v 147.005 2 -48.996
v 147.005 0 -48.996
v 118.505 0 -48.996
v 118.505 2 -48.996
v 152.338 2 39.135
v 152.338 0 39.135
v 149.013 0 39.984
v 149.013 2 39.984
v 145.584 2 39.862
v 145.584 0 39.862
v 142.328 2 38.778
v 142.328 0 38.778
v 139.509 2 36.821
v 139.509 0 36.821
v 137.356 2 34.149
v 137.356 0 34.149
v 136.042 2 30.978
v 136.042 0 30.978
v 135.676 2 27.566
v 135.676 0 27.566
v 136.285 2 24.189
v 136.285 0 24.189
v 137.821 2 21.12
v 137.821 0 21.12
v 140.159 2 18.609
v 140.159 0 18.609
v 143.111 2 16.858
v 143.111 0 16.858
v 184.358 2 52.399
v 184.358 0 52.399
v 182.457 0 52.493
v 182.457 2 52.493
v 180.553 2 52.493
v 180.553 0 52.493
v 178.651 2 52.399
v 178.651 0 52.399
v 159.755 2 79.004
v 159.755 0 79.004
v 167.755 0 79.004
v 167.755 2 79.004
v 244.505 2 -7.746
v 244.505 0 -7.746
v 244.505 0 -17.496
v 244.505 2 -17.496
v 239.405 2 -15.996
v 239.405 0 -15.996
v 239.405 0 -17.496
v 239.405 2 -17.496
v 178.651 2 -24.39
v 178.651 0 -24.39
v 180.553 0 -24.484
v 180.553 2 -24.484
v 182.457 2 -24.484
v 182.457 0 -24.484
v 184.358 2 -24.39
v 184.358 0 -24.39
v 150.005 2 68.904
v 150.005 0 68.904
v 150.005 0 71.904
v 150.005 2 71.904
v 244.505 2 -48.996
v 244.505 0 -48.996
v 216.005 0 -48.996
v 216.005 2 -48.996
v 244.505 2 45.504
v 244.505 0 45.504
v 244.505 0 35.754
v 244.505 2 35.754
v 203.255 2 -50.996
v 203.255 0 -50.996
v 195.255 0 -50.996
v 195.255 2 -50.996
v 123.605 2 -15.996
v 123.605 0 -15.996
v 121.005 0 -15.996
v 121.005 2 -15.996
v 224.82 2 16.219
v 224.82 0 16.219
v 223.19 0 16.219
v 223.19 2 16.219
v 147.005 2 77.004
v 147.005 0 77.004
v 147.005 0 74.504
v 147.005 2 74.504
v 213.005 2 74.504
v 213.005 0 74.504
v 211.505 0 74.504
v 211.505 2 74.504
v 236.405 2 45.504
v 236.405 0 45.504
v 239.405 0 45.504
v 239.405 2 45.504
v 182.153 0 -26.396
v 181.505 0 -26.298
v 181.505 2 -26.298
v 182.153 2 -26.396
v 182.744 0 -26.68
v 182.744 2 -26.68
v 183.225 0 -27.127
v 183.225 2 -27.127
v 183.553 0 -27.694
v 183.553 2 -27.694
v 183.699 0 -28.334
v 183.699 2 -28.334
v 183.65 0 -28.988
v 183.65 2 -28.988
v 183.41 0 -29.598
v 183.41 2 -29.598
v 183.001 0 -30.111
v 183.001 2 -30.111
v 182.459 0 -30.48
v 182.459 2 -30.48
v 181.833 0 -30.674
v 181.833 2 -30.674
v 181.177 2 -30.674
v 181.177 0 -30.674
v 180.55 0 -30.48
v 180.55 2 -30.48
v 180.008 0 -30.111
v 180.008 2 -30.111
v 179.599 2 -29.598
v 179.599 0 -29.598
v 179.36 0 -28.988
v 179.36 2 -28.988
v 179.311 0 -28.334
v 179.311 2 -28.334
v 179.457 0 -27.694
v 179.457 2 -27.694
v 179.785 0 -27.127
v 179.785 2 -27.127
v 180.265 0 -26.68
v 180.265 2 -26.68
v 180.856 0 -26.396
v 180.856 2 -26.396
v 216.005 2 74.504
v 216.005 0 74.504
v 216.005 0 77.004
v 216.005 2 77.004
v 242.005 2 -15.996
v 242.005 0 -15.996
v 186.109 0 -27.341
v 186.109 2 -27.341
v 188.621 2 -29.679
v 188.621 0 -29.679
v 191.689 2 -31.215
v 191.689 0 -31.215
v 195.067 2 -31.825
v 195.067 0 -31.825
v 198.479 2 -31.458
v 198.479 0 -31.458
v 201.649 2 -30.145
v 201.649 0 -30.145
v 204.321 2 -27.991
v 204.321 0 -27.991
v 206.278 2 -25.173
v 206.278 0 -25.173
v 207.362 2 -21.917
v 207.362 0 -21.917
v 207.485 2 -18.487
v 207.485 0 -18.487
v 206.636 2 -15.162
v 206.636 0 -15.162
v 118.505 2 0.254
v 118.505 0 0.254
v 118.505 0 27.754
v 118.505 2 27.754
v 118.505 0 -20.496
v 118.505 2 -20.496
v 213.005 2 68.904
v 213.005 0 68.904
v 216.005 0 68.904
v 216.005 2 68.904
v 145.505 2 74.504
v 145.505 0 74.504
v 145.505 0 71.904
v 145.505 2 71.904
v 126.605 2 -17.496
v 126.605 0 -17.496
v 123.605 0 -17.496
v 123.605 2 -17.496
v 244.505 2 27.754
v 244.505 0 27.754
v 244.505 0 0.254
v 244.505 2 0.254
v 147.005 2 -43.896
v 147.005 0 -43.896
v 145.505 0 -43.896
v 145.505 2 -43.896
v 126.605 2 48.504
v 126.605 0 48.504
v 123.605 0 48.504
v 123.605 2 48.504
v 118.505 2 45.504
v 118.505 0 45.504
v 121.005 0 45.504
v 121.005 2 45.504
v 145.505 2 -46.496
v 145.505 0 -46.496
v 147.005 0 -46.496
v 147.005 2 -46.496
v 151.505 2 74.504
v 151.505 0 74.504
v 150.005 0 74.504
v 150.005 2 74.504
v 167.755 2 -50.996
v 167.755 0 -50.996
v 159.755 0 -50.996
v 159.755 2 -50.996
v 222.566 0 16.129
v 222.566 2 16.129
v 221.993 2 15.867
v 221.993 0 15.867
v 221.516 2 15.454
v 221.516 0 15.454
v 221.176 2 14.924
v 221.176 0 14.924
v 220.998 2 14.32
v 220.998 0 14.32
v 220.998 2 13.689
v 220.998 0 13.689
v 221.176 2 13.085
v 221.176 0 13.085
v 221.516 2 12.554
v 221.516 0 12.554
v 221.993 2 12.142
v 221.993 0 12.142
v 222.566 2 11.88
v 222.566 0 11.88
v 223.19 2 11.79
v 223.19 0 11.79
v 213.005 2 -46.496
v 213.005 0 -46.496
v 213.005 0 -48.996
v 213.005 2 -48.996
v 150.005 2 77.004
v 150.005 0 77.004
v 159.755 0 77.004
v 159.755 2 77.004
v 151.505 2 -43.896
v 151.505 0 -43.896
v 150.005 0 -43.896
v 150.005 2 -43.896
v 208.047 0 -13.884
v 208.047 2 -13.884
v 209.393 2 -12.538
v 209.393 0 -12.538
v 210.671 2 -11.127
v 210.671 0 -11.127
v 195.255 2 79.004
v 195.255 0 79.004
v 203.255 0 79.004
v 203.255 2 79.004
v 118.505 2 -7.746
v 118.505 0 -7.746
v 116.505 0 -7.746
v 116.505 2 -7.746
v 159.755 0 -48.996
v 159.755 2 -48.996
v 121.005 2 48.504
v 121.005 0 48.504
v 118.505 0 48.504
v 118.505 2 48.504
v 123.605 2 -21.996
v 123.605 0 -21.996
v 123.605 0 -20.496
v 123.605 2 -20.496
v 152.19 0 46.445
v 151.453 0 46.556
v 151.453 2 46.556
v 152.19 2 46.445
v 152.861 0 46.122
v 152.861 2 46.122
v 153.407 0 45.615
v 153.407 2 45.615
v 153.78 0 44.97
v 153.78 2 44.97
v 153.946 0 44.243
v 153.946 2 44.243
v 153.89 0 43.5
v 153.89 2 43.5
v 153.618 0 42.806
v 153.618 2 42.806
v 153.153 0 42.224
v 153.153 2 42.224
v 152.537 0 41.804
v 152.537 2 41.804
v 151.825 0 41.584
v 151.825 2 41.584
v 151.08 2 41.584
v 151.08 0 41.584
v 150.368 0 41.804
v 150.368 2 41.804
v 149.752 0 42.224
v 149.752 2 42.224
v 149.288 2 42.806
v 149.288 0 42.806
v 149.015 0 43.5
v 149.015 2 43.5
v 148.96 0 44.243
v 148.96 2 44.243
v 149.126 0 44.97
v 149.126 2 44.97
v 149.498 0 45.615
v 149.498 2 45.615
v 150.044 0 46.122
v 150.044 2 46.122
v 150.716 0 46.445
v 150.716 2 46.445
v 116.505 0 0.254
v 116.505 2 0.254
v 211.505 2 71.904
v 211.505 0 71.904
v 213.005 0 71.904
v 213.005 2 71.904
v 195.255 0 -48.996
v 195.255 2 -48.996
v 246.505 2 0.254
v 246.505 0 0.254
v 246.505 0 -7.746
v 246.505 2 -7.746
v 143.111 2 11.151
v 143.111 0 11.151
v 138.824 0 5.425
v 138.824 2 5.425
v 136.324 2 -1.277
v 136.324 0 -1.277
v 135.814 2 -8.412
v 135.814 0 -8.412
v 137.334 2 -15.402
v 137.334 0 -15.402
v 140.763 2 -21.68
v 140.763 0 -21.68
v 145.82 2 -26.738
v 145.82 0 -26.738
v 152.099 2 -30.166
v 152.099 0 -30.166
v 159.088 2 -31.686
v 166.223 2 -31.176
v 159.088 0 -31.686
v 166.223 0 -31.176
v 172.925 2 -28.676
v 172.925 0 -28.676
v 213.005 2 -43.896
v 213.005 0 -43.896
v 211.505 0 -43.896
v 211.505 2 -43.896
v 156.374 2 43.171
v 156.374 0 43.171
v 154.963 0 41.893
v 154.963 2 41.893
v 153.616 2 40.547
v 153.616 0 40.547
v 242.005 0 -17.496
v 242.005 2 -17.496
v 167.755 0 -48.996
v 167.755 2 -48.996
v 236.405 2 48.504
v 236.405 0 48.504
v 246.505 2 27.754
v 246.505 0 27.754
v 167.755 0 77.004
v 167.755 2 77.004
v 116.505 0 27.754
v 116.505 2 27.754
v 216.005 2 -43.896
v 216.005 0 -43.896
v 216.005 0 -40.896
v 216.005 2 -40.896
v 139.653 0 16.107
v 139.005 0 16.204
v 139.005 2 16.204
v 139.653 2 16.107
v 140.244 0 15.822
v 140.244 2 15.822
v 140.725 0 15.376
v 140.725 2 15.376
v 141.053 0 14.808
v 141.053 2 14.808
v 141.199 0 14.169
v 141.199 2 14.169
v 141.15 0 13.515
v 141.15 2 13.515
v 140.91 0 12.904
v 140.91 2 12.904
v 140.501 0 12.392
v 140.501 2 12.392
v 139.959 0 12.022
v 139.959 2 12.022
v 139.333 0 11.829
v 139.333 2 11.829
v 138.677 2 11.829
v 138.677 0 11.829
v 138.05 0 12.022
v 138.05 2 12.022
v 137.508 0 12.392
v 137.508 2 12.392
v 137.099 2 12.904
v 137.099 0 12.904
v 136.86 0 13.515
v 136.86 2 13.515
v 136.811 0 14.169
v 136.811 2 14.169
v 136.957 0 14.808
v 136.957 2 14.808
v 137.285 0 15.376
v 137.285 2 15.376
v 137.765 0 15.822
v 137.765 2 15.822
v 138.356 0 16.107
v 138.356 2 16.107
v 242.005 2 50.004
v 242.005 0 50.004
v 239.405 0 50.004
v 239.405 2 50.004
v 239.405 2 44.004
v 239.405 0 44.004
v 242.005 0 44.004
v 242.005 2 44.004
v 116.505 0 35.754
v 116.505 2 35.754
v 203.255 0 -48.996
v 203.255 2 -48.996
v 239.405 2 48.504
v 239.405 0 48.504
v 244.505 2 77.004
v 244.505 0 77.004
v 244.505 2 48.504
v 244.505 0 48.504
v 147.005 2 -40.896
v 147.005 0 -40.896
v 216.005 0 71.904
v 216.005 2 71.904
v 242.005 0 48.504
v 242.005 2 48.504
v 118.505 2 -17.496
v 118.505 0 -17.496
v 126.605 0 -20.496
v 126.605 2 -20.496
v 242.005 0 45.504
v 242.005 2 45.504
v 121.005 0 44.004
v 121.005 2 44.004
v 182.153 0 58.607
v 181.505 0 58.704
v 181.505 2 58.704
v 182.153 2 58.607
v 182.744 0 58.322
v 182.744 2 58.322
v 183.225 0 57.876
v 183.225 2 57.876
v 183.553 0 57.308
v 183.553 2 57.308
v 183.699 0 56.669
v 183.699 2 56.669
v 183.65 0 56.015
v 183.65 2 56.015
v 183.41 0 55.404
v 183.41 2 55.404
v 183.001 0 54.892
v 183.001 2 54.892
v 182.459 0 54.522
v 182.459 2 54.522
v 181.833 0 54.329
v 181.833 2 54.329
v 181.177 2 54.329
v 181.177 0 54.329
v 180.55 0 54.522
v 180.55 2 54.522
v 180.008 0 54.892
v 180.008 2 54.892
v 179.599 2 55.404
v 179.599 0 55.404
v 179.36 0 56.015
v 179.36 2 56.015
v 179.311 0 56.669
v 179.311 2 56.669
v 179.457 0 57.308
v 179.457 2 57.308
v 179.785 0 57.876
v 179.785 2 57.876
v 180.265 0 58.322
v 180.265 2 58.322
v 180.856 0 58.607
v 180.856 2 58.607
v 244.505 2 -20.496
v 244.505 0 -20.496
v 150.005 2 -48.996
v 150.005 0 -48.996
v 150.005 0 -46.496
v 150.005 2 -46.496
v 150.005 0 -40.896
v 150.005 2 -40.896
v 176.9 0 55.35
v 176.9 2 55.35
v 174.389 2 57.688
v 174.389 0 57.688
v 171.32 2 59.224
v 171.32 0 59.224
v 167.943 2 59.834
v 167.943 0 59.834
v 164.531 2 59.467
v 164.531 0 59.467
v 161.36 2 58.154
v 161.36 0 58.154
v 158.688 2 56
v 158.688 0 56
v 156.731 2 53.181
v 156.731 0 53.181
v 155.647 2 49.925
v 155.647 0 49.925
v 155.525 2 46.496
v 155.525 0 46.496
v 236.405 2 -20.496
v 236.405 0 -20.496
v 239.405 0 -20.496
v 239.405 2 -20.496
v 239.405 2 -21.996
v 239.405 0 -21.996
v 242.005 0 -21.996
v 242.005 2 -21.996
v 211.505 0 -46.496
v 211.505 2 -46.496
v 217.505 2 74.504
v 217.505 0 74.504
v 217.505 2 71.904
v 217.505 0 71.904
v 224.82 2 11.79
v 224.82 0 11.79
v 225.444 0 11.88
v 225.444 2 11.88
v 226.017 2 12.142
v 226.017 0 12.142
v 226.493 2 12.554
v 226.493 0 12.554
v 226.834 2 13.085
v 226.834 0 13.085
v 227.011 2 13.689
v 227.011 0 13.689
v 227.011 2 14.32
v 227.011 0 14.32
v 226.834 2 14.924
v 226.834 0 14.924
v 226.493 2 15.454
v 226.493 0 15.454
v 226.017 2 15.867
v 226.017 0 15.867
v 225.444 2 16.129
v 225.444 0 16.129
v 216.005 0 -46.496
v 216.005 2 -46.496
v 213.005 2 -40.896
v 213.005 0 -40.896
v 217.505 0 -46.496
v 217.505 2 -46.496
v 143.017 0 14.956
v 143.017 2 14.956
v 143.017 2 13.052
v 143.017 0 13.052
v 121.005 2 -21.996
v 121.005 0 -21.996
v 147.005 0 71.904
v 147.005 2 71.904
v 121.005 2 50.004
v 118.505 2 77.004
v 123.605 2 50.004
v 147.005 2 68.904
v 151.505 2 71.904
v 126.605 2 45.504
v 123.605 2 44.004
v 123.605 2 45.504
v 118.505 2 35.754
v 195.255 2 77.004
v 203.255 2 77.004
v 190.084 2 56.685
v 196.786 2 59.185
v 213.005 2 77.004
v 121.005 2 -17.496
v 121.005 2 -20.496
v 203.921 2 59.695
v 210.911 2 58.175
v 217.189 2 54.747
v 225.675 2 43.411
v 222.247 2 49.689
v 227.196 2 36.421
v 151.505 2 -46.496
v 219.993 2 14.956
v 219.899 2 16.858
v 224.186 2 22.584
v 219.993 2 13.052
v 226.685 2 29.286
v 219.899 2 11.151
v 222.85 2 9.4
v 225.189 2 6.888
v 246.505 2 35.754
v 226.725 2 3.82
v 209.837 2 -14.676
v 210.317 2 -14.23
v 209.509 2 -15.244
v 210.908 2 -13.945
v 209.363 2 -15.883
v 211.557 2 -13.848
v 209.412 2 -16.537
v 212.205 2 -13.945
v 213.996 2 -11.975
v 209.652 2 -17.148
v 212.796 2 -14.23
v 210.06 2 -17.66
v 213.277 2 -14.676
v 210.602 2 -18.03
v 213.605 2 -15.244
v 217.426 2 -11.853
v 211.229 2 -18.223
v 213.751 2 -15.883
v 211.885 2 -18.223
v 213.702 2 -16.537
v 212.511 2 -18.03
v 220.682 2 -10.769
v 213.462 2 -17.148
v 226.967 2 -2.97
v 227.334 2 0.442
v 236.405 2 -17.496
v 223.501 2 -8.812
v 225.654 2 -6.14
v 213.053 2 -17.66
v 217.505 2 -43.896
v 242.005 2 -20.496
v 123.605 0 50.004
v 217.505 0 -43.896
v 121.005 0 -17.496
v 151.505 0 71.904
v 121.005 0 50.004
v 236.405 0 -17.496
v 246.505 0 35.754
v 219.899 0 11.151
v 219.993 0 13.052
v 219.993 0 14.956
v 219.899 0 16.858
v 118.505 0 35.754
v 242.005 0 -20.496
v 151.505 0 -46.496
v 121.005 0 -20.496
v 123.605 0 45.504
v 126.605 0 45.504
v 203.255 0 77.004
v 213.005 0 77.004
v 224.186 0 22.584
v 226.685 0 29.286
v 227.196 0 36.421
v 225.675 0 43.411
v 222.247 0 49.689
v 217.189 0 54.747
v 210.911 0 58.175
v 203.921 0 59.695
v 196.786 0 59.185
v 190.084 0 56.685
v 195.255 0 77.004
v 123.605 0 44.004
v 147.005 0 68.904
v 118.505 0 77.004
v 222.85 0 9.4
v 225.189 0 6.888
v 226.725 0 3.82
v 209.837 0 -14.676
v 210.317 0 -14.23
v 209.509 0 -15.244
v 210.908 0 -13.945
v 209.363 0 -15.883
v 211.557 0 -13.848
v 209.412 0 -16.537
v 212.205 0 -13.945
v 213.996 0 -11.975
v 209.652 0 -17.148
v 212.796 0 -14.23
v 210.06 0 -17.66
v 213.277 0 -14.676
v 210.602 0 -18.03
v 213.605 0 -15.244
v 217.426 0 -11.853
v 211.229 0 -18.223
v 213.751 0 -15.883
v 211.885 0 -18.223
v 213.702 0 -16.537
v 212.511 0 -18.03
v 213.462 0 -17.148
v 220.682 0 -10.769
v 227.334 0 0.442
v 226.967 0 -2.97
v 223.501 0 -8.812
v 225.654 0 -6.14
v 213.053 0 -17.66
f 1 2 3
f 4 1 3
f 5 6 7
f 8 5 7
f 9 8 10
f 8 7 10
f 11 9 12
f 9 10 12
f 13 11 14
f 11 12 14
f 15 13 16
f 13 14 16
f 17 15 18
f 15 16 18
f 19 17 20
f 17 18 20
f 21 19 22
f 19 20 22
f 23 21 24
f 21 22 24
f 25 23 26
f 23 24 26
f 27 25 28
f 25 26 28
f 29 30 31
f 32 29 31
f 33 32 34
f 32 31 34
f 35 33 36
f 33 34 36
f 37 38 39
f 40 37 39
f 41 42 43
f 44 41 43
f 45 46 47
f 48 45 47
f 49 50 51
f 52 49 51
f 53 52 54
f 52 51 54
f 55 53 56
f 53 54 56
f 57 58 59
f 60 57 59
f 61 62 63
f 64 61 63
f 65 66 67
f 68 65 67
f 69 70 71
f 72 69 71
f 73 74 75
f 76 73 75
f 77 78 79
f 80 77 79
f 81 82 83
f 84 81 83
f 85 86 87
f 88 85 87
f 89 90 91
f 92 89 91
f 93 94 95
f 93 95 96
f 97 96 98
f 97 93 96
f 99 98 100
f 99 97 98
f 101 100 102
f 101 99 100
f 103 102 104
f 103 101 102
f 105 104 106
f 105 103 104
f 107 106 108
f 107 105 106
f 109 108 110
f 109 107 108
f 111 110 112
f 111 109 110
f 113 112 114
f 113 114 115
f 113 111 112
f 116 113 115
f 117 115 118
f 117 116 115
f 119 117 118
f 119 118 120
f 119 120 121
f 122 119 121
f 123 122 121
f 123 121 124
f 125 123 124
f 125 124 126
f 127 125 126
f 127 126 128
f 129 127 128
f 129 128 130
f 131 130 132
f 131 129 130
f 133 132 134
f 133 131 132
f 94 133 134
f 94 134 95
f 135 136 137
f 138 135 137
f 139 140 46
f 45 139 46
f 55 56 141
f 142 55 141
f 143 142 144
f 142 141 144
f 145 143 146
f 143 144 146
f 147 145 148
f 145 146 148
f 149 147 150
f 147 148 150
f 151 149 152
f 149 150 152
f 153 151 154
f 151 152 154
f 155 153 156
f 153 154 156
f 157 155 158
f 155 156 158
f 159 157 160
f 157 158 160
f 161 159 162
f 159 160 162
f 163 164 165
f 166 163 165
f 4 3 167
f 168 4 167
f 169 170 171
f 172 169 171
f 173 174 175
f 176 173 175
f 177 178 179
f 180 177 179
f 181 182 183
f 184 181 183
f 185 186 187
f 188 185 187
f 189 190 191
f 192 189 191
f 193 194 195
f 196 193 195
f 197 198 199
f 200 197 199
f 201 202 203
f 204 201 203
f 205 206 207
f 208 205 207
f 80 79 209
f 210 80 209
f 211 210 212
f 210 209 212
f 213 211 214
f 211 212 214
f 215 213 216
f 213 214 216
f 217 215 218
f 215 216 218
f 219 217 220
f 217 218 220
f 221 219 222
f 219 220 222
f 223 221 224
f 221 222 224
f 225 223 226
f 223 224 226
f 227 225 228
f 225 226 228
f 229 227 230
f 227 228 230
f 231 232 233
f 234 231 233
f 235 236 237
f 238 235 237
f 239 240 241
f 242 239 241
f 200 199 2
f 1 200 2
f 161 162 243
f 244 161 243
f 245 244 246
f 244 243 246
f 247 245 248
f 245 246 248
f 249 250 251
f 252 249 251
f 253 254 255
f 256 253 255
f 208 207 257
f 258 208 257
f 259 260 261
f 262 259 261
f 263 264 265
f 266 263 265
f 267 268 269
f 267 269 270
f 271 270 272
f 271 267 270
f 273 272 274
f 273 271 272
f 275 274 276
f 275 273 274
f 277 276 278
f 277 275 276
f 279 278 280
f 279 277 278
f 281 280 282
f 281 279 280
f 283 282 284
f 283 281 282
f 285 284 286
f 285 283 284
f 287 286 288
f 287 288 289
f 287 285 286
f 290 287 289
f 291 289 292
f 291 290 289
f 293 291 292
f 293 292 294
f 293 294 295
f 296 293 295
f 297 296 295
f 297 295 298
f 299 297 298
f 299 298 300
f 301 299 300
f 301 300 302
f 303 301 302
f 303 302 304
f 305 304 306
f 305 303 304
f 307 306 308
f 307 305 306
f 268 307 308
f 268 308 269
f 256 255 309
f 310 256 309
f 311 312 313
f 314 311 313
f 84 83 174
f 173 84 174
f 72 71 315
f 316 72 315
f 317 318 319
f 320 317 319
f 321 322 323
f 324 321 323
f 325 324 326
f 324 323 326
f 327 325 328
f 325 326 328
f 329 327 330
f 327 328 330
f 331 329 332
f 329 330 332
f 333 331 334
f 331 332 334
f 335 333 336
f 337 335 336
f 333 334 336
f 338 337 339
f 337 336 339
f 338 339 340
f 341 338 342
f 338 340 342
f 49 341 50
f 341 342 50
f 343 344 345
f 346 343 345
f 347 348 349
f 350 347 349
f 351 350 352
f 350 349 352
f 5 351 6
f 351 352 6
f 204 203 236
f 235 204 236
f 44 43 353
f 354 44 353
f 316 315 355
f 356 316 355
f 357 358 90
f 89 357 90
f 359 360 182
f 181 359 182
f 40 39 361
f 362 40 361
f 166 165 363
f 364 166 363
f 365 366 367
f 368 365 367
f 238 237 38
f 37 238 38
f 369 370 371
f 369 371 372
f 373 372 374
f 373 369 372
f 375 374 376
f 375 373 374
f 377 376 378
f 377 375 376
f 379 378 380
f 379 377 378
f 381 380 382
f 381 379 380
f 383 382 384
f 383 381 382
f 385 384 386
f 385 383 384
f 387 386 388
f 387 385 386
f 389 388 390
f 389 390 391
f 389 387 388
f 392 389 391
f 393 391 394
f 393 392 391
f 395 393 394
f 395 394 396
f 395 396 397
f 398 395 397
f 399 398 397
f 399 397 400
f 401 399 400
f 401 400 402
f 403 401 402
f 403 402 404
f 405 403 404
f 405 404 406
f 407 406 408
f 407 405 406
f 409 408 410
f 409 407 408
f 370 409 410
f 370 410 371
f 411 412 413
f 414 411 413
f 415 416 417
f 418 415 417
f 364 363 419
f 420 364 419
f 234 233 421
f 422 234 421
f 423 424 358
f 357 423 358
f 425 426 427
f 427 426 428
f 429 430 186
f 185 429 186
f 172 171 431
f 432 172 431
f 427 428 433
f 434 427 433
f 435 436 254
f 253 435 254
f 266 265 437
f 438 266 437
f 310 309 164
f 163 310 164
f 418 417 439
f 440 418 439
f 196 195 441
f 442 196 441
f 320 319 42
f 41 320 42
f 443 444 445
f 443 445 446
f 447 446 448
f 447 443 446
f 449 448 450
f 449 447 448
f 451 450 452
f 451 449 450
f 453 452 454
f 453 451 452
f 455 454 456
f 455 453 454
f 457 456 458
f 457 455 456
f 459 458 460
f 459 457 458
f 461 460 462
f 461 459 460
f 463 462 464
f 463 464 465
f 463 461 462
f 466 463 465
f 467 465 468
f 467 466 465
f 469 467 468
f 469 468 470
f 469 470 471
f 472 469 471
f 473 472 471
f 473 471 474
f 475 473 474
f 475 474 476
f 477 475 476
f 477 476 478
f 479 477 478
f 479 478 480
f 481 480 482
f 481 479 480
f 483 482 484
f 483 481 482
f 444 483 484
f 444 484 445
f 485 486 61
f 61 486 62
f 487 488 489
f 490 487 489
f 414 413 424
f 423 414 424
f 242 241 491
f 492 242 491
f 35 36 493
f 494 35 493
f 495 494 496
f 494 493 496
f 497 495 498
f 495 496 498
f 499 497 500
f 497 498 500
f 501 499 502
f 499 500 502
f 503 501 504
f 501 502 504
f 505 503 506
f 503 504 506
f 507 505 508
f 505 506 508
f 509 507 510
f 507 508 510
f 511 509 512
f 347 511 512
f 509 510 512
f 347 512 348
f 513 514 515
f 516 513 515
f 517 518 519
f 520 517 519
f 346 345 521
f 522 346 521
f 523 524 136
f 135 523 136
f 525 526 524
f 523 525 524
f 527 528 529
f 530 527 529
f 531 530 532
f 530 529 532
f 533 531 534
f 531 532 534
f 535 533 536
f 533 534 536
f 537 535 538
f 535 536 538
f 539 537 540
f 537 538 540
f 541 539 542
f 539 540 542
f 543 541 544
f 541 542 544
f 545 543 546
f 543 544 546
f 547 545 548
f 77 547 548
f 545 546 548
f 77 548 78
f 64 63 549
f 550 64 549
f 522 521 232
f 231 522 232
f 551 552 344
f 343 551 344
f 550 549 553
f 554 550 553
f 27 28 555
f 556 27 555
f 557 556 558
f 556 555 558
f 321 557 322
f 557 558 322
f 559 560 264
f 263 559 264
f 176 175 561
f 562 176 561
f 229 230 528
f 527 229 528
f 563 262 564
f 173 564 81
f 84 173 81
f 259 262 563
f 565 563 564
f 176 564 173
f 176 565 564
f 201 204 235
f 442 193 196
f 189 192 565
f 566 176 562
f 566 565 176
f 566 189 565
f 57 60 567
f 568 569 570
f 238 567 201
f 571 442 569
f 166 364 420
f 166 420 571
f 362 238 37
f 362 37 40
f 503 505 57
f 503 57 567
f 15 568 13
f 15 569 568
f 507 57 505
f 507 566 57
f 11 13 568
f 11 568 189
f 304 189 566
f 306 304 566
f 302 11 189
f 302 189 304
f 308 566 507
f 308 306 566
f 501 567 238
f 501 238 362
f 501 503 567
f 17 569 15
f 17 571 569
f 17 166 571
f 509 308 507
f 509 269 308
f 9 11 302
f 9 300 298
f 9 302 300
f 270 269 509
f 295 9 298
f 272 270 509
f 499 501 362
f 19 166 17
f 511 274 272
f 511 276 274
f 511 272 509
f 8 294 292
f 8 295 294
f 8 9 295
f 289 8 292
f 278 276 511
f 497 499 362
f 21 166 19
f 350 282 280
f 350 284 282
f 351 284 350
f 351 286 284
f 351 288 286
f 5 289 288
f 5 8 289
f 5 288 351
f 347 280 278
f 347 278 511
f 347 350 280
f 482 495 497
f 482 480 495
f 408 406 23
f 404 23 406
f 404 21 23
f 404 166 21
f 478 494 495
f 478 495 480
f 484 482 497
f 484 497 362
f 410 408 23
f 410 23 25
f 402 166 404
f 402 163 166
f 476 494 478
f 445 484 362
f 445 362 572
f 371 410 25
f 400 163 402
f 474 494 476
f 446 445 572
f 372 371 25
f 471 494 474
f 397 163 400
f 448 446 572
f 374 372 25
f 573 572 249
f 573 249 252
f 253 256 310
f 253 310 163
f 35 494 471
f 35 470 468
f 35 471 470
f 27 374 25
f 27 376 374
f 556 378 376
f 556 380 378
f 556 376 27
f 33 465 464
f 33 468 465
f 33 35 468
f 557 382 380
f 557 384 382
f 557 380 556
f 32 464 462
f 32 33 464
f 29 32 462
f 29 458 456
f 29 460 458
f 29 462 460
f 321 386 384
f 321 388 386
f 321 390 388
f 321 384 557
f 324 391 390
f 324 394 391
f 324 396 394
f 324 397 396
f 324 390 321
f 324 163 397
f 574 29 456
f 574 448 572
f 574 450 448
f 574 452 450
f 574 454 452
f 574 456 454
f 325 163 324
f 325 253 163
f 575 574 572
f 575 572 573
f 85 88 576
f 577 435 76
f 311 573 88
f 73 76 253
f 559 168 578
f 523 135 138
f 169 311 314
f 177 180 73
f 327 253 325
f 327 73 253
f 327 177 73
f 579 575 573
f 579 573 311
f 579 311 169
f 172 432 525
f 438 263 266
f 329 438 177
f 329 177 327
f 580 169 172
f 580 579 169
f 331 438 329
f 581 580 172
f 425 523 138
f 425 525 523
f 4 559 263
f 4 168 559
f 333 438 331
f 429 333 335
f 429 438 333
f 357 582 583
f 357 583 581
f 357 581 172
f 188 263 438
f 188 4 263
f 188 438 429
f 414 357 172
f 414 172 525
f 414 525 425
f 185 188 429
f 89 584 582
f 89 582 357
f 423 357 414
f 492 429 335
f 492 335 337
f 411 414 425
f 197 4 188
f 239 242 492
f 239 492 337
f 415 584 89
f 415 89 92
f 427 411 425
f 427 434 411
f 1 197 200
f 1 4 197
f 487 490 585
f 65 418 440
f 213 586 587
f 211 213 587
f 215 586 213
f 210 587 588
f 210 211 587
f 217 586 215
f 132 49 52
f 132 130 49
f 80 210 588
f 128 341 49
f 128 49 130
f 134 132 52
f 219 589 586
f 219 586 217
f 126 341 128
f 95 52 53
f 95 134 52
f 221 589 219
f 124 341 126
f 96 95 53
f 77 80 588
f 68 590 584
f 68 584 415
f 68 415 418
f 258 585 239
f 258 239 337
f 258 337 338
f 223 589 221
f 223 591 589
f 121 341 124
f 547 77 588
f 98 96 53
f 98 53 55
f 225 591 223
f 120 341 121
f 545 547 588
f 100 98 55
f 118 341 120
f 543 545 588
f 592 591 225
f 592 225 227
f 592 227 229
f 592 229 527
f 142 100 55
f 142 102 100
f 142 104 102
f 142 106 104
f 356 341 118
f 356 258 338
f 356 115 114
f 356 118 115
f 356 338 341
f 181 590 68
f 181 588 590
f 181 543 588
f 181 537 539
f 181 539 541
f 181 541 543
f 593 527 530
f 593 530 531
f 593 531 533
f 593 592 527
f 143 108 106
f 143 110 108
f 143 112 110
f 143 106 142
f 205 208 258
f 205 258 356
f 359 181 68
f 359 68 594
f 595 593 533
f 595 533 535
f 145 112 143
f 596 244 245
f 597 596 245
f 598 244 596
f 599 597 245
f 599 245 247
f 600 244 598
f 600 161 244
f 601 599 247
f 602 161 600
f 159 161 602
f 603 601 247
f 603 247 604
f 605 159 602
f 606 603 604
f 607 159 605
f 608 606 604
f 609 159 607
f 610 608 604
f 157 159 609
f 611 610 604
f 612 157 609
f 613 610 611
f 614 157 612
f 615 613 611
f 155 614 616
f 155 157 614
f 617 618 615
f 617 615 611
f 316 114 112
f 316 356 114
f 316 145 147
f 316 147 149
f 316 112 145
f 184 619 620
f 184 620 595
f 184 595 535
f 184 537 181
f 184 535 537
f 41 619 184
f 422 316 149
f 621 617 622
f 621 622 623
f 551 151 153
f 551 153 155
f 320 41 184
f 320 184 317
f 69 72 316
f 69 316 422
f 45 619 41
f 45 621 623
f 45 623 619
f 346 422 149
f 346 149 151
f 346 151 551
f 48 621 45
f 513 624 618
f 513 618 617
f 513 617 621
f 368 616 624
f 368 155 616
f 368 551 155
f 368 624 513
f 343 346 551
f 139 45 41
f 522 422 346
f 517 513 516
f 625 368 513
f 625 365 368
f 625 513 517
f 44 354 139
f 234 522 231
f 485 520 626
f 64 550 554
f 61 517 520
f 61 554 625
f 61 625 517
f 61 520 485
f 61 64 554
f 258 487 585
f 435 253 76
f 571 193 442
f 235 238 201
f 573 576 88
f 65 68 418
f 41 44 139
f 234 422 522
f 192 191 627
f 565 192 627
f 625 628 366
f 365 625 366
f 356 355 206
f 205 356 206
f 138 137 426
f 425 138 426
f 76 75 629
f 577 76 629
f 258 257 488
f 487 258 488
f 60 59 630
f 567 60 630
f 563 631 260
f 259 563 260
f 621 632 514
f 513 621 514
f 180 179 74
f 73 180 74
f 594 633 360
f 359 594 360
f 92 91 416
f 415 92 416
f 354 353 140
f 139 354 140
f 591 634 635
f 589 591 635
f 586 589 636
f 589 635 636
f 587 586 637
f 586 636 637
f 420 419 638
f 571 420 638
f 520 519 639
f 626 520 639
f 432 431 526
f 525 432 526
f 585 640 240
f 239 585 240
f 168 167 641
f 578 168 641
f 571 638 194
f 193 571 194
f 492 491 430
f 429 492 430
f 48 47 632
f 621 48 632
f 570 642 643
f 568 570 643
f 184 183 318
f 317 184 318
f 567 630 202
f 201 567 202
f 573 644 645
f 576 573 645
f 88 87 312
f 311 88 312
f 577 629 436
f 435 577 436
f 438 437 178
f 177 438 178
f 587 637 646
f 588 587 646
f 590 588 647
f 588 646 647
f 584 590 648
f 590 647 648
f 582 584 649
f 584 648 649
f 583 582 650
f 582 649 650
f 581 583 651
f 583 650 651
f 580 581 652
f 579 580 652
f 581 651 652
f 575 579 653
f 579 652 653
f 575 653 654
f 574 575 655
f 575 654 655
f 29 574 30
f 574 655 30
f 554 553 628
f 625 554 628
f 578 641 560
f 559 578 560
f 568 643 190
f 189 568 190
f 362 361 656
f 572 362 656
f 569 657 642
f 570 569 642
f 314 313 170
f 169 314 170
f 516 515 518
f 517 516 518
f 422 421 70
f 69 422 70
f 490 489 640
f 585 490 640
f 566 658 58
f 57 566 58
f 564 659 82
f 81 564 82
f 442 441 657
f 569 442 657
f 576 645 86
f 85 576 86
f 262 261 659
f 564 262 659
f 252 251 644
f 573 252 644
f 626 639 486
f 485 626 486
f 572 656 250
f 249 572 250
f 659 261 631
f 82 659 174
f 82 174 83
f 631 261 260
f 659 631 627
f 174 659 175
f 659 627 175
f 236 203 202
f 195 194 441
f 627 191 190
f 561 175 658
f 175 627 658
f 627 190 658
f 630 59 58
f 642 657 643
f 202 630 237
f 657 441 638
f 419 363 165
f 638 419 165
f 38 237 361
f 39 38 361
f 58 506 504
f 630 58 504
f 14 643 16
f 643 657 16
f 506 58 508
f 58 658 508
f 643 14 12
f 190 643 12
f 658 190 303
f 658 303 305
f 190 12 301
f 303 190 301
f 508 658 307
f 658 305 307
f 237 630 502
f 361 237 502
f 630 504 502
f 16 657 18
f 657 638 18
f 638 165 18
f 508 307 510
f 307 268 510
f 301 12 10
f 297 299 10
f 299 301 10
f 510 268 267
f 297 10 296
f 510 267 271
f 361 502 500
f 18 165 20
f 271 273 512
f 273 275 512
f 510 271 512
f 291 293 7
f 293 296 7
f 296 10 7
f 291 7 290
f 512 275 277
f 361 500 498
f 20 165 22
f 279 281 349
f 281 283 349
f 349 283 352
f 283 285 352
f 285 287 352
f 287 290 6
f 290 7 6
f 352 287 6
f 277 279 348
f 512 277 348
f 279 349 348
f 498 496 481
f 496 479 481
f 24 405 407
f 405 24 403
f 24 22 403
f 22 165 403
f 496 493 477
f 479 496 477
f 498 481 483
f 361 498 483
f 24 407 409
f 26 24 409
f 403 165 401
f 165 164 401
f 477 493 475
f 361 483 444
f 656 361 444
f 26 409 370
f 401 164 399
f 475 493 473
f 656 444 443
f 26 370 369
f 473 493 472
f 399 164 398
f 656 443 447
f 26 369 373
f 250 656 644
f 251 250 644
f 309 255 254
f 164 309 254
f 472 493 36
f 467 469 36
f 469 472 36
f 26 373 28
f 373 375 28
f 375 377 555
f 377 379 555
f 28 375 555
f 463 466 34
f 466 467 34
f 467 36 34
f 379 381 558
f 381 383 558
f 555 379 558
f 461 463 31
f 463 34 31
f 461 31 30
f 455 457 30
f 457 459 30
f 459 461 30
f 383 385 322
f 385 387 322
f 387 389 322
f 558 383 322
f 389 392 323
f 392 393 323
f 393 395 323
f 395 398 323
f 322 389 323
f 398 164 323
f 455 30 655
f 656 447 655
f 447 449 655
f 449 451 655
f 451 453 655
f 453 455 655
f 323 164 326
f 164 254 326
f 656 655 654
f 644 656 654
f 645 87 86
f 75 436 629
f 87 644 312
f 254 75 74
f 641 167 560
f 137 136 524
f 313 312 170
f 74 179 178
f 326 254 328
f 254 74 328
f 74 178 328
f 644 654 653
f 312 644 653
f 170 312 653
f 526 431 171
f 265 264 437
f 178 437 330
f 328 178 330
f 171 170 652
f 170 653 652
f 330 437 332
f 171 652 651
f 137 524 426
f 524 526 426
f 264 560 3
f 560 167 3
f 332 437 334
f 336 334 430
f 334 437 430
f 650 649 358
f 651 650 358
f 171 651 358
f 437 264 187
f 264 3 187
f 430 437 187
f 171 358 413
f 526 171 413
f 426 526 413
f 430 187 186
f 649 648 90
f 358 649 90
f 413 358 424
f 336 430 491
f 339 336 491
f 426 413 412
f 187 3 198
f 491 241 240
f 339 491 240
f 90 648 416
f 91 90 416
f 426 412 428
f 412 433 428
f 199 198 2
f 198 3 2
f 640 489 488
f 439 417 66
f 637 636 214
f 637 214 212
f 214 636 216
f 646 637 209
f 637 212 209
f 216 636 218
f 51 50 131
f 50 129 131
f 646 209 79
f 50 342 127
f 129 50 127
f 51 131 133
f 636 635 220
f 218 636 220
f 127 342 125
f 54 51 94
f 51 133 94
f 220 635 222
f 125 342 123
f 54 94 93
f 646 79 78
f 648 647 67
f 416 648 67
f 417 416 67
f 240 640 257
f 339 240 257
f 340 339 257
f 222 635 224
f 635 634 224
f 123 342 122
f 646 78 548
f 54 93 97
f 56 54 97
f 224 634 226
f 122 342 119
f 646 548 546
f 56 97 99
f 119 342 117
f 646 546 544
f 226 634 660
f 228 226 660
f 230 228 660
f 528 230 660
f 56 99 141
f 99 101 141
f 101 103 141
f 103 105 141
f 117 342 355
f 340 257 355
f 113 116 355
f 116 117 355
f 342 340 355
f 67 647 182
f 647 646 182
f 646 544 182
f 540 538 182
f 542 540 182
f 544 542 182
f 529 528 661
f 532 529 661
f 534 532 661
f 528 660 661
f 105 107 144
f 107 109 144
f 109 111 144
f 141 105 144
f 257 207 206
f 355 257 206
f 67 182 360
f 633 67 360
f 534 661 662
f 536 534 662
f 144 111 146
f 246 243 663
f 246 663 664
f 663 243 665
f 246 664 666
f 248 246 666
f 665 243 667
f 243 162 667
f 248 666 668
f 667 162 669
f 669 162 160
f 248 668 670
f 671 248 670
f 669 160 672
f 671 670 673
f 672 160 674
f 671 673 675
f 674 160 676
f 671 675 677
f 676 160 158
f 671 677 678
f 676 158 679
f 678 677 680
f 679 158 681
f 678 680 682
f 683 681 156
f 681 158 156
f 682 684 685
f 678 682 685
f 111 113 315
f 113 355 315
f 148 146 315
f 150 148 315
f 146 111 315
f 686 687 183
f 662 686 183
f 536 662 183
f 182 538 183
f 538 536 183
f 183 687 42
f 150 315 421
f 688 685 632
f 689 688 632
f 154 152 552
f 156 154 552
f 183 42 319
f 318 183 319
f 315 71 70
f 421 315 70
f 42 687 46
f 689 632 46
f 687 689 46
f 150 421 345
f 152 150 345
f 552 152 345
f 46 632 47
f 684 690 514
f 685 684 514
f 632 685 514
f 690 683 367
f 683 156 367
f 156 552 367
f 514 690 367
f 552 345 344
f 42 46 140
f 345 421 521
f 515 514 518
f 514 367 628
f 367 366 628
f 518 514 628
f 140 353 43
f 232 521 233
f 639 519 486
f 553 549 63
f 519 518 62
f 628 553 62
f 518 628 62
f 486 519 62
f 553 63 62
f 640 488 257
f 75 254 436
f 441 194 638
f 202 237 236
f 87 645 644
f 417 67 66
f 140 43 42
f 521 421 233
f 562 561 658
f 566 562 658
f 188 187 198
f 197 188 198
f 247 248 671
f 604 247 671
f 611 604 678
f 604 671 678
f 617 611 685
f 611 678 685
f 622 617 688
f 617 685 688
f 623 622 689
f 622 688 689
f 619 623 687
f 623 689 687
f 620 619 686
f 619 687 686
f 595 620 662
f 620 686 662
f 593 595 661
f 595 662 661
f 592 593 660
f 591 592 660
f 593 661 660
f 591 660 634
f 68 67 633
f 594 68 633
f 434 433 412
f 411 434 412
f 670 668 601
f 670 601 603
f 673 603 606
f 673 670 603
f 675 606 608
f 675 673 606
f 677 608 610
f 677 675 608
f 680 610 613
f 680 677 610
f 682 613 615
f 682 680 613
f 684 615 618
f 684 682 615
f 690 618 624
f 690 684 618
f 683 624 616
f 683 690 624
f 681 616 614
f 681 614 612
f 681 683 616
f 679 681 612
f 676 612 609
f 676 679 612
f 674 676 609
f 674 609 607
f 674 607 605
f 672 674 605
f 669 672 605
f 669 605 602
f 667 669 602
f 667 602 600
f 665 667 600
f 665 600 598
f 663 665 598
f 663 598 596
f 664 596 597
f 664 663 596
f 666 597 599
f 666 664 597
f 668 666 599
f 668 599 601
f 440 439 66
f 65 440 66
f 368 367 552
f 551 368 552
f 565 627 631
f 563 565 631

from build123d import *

# Parameters (mm, degrees)
SKETCH_1_R      = 2.2
SKETCH_1_R_2    = 2.5
EXTRUDE_1_DEPTH = 2


with BuildPart() as part:
    # 草图1 → 凸台-拉伸1 (new body)
    with BuildSketch(Plane(origin=(0, 0, 0), x_dir=(1, 0, 0), z_dir=(0, 1, 0))):
        Polygon((159.754738648, 48.995603023), (150.004738648, 48.995603023), (150.004738648, 46.495603023), (151.504738648, 46.495603023), (151.504738648, 43.895603023), (150.004738648, 43.895603023), (150.004738648, 40.895603023), (147.004738648, 40.895603023), (147.004738648, 43.895603023), (145.504738648, 43.895603023), (145.504738648, 46.495603023), (147.004738648, 46.495603023), (147.004738648, 48.995603023), (138.604738648, 48.995603023), (133.504738648, 48.995603023), (118.504738648, 48.995603023), (118.504738648, 33.995603023), (118.504738648, 21.495603023), (118.504738648, 20.495603023), (121.004738648, 20.495603023), (121.004738648, 21.995603023), (123.604738648, 21.995603023), (123.604738648, 20.495603023), (126.604738648, 20.495603023), (126.604738648, 17.495603023), (123.604738648, 17.495603023), (123.604738648, 15.995603023), (121.004738648, 15.995603023), (121.004738648, 17.495603023), (118.504738648, 17.495603023), (118.504738648, 7.745603023), (116.504738648, 7.745603023), (116.504738648, -0.254396977), (118.504738648, -0.254396977), (118.504738648, -27.754396977), (116.504738648, -27.754396977), (116.504738648, -35.754396977), (118.504738648, -35.754396977), (118.504738648, -45.504396977), (121.004738648, -45.504396977), (121.004738648, -44.004396977), (123.604738648, -44.004396977), (123.604738648, -45.504396977), (126.604738648, -45.504396977), (126.604738648, -48.504396977), (123.604738648, -48.504396977), (123.604738648, -50.004396977), (121.004738648, -50.004396977), (121.004738648, -48.504396977), (118.504738648, -48.504396977), (118.504738648, -56.904396977), (118.504738648, -62.004396977), (118.504738648, -77.004396977), (133.504738648, -77.004396977), (146.004738648, -77.004396977), (147.004738648, -77.004396977), (147.004738648, -74.504396977), (145.504738648, -74.504396977), (145.504738648, -71.904396977), (147.004738648, -71.904396977), (147.004738648, -68.904396977), (150.004738648, -68.904396977), (150.004738648, -71.904396977), (151.504738648, -71.904396977), (151.504738648, -74.504396977), (150.004738648, -74.504396977), (150.004738648, -77.004396977), (159.754738648, -77.004396977), (159.754738648, -79.004396977), (167.754738648, -79.004396977), (167.754738648, -77.004396977), (195.254738648, -77.004396977), (195.254738648, -79.004396977), (203.254738648, -79.004396977), (203.254738648, -77.004396977), (213.004738648, -77.004396977), (213.004738648, -74.504396977), (211.504738648, -74.504396977), (211.504738648, -71.904396977), (213.004738648, -71.904396977), (213.004738648, -68.904396977), (216.004738648, -68.904396977), (216.004738648, -71.904396977), (217.504738648, -71.904396977), (217.504738648, -74.504396977), (216.004738648, -74.504396977), (216.004738648, -77.004396977), (224.404738648, -77.004396977), (229.504738648, -77.004396977), (244.504738648, -77.004396977), (244.504738648, -62.004396977), (244.504738648, -49.504396977), (244.504738648, -48.504396977), (242.004738648, -48.504396977), (242.004738648, -50.004396977), (239.404738648, -50.004396977), (239.404738648, -48.504396977), (236.404738648, -48.504396977), (236.404738648, -45.504396977), (239.404738648, -45.504396977), (239.404738648, -44.004396977), (242.004738648, -44.004396977), (242.004738648, -45.504396977), (244.504738648, -45.504396977), (244.504738648, -35.754396977), (246.504738648, -35.754396977), (246.504738648, -27.754396977), (244.504738648, -27.754396977), (244.504738648, -0.254396977), (246.504738648, -0.254396977), (246.504738648, 7.745603023), (244.504738648, 7.745603023), (244.504738648, 17.495603023), (242.004738648, 17.495603023), (242.004738648, 15.995603023), (239.404738648, 15.995603023), (239.404738648, 17.495603023), (236.404738648, 17.495603023), (236.404738648, 20.495603023), (239.404738648, 20.495603023), (239.404738648, 21.995603023), (242.004738648, 21.995603023), (242.004738648, 20.495603023), (244.504738648, 20.495603023), (244.504738648, 28.895603023), (244.504738648, 33.995603023), (244.504738648, 48.995603023), (229.504738648, 48.995603023), (217.004738648, 48.995603023), (216.004738648, 48.995603023), (216.004738648, 46.495603023), (217.504738648, 46.495603023), (217.504738648, 43.895603023), (216.004738648, 43.895603023), (216.004738648, 40.895603023), (213.004738648, 40.895603023), (213.004738648, 43.895603023), (211.504738648, 43.895603023), (211.504738648, 46.495603023), (213.004738648, 46.495603023), (213.004738648, 48.995603023), (203.254738648, 48.995603023), (203.254738648, 50.995603023), (195.254738648, 50.995603023), (195.254738648, 48.995603023), (167.754738648, 48.995603023), (167.754738648, 50.995603023), (159.754738648, 50.995603023), align=None)
        with Locations(Location((181.504738648, -56.504396977, 0), (0, 0, 270))):
            Circle(SKETCH_1_R, mode=Mode.SUBTRACT)
        with Locations(Location((139.004738648, -14.004396977, 0), (0, 0, 270))):
            Circle(SKETCH_1_R, mode=Mode.SUBTRACT)
        with Locations(Location((211.556776849, 16.047641223, 0), (0, 0, 270))):
            Circle(SKETCH_1_R, mode=Mode.SUBTRACT)
        with Locations(Location((181.504738648, 28.49819903, 0), (0, 0, 270))):
            Circle(SKETCH_1_R, mode=Mode.SUBTRACT)
        with Locations(Location((151.452700448, -44.056435178, 0), (0, 0, 270))):
            Circle(SKETCH_1_R_2, mode=Mode.SUBTRACT)
        with BuildLine():
            Line((223.189738648, -11.79024286), (224.819738648, -11.79024286))
            ThreePointArc((224.819738648, -11.79024286), (227.033892766, -14.004396977), (224.819738648, -16.218551095))
            Line((224.819738648, -16.218551095), (223.189738648, -16.218551095))
            ThreePointArc((223.189738648, -16.218551095), (220.975584531, -14.004396977), (223.189738648, -11.79024286))
        make_face(mode=Mode.SUBTRACT)
        with BuildLine():
            ThreePointArc((156.373636186, -43.170776407), (154.281127573, -41.228008053), (152.338359218, -39.135499439))
            ThreePointArc((152.338359218, -39.135499439), (136.585624733, -32.610503171), (143.110621001, -16.857768685))
            ThreePointArc((143.110621001, -16.857768685), (143.004738648, -14.004396977), (143.110621001, -11.15102527))
            ThreePointArc((143.110621001, -11.15102527), (143.110621001, 24.38972067), (178.65136694, 24.38972067))
            ThreePointArc((178.65136694, 24.38972067), (181.504738648, 24.495603023), (184.358110356, 24.38972067))
            ThreePointArc((184.358110356, 24.38972067), (200.110844842, 30.914716938), (206.63584111, 15.161982452))
            ThreePointArc((206.63584111, 15.161982452), (208.728349724, 13.219214098), (210.671118078, 11.126705484))
            ThreePointArc((210.671118078, 11.126705484), (226.423852564, 4.601709216), (219.898856295, -11.15102527))
            ThreePointArc((219.898856295, -11.15102527), (220.004738648, -14.004396977), (219.898856295, -16.857768685))
            ThreePointArc((219.898856295, -16.857768685), (219.898856295, -52.398514625), (184.358110356, -52.398514625))
            ThreePointArc((184.358110356, -52.398514625), (181.504738648, -52.504396977), (178.65136694, -52.398514625))
            ThreePointArc((178.65136694, -52.398514625), (162.898632455, -58.923510893), (156.373636186, -43.170776407))
        make_face(mode=Mode.SUBTRACT)
    extrude(amount=EXTRUDE_1_DEPTH)


solid = part.part
